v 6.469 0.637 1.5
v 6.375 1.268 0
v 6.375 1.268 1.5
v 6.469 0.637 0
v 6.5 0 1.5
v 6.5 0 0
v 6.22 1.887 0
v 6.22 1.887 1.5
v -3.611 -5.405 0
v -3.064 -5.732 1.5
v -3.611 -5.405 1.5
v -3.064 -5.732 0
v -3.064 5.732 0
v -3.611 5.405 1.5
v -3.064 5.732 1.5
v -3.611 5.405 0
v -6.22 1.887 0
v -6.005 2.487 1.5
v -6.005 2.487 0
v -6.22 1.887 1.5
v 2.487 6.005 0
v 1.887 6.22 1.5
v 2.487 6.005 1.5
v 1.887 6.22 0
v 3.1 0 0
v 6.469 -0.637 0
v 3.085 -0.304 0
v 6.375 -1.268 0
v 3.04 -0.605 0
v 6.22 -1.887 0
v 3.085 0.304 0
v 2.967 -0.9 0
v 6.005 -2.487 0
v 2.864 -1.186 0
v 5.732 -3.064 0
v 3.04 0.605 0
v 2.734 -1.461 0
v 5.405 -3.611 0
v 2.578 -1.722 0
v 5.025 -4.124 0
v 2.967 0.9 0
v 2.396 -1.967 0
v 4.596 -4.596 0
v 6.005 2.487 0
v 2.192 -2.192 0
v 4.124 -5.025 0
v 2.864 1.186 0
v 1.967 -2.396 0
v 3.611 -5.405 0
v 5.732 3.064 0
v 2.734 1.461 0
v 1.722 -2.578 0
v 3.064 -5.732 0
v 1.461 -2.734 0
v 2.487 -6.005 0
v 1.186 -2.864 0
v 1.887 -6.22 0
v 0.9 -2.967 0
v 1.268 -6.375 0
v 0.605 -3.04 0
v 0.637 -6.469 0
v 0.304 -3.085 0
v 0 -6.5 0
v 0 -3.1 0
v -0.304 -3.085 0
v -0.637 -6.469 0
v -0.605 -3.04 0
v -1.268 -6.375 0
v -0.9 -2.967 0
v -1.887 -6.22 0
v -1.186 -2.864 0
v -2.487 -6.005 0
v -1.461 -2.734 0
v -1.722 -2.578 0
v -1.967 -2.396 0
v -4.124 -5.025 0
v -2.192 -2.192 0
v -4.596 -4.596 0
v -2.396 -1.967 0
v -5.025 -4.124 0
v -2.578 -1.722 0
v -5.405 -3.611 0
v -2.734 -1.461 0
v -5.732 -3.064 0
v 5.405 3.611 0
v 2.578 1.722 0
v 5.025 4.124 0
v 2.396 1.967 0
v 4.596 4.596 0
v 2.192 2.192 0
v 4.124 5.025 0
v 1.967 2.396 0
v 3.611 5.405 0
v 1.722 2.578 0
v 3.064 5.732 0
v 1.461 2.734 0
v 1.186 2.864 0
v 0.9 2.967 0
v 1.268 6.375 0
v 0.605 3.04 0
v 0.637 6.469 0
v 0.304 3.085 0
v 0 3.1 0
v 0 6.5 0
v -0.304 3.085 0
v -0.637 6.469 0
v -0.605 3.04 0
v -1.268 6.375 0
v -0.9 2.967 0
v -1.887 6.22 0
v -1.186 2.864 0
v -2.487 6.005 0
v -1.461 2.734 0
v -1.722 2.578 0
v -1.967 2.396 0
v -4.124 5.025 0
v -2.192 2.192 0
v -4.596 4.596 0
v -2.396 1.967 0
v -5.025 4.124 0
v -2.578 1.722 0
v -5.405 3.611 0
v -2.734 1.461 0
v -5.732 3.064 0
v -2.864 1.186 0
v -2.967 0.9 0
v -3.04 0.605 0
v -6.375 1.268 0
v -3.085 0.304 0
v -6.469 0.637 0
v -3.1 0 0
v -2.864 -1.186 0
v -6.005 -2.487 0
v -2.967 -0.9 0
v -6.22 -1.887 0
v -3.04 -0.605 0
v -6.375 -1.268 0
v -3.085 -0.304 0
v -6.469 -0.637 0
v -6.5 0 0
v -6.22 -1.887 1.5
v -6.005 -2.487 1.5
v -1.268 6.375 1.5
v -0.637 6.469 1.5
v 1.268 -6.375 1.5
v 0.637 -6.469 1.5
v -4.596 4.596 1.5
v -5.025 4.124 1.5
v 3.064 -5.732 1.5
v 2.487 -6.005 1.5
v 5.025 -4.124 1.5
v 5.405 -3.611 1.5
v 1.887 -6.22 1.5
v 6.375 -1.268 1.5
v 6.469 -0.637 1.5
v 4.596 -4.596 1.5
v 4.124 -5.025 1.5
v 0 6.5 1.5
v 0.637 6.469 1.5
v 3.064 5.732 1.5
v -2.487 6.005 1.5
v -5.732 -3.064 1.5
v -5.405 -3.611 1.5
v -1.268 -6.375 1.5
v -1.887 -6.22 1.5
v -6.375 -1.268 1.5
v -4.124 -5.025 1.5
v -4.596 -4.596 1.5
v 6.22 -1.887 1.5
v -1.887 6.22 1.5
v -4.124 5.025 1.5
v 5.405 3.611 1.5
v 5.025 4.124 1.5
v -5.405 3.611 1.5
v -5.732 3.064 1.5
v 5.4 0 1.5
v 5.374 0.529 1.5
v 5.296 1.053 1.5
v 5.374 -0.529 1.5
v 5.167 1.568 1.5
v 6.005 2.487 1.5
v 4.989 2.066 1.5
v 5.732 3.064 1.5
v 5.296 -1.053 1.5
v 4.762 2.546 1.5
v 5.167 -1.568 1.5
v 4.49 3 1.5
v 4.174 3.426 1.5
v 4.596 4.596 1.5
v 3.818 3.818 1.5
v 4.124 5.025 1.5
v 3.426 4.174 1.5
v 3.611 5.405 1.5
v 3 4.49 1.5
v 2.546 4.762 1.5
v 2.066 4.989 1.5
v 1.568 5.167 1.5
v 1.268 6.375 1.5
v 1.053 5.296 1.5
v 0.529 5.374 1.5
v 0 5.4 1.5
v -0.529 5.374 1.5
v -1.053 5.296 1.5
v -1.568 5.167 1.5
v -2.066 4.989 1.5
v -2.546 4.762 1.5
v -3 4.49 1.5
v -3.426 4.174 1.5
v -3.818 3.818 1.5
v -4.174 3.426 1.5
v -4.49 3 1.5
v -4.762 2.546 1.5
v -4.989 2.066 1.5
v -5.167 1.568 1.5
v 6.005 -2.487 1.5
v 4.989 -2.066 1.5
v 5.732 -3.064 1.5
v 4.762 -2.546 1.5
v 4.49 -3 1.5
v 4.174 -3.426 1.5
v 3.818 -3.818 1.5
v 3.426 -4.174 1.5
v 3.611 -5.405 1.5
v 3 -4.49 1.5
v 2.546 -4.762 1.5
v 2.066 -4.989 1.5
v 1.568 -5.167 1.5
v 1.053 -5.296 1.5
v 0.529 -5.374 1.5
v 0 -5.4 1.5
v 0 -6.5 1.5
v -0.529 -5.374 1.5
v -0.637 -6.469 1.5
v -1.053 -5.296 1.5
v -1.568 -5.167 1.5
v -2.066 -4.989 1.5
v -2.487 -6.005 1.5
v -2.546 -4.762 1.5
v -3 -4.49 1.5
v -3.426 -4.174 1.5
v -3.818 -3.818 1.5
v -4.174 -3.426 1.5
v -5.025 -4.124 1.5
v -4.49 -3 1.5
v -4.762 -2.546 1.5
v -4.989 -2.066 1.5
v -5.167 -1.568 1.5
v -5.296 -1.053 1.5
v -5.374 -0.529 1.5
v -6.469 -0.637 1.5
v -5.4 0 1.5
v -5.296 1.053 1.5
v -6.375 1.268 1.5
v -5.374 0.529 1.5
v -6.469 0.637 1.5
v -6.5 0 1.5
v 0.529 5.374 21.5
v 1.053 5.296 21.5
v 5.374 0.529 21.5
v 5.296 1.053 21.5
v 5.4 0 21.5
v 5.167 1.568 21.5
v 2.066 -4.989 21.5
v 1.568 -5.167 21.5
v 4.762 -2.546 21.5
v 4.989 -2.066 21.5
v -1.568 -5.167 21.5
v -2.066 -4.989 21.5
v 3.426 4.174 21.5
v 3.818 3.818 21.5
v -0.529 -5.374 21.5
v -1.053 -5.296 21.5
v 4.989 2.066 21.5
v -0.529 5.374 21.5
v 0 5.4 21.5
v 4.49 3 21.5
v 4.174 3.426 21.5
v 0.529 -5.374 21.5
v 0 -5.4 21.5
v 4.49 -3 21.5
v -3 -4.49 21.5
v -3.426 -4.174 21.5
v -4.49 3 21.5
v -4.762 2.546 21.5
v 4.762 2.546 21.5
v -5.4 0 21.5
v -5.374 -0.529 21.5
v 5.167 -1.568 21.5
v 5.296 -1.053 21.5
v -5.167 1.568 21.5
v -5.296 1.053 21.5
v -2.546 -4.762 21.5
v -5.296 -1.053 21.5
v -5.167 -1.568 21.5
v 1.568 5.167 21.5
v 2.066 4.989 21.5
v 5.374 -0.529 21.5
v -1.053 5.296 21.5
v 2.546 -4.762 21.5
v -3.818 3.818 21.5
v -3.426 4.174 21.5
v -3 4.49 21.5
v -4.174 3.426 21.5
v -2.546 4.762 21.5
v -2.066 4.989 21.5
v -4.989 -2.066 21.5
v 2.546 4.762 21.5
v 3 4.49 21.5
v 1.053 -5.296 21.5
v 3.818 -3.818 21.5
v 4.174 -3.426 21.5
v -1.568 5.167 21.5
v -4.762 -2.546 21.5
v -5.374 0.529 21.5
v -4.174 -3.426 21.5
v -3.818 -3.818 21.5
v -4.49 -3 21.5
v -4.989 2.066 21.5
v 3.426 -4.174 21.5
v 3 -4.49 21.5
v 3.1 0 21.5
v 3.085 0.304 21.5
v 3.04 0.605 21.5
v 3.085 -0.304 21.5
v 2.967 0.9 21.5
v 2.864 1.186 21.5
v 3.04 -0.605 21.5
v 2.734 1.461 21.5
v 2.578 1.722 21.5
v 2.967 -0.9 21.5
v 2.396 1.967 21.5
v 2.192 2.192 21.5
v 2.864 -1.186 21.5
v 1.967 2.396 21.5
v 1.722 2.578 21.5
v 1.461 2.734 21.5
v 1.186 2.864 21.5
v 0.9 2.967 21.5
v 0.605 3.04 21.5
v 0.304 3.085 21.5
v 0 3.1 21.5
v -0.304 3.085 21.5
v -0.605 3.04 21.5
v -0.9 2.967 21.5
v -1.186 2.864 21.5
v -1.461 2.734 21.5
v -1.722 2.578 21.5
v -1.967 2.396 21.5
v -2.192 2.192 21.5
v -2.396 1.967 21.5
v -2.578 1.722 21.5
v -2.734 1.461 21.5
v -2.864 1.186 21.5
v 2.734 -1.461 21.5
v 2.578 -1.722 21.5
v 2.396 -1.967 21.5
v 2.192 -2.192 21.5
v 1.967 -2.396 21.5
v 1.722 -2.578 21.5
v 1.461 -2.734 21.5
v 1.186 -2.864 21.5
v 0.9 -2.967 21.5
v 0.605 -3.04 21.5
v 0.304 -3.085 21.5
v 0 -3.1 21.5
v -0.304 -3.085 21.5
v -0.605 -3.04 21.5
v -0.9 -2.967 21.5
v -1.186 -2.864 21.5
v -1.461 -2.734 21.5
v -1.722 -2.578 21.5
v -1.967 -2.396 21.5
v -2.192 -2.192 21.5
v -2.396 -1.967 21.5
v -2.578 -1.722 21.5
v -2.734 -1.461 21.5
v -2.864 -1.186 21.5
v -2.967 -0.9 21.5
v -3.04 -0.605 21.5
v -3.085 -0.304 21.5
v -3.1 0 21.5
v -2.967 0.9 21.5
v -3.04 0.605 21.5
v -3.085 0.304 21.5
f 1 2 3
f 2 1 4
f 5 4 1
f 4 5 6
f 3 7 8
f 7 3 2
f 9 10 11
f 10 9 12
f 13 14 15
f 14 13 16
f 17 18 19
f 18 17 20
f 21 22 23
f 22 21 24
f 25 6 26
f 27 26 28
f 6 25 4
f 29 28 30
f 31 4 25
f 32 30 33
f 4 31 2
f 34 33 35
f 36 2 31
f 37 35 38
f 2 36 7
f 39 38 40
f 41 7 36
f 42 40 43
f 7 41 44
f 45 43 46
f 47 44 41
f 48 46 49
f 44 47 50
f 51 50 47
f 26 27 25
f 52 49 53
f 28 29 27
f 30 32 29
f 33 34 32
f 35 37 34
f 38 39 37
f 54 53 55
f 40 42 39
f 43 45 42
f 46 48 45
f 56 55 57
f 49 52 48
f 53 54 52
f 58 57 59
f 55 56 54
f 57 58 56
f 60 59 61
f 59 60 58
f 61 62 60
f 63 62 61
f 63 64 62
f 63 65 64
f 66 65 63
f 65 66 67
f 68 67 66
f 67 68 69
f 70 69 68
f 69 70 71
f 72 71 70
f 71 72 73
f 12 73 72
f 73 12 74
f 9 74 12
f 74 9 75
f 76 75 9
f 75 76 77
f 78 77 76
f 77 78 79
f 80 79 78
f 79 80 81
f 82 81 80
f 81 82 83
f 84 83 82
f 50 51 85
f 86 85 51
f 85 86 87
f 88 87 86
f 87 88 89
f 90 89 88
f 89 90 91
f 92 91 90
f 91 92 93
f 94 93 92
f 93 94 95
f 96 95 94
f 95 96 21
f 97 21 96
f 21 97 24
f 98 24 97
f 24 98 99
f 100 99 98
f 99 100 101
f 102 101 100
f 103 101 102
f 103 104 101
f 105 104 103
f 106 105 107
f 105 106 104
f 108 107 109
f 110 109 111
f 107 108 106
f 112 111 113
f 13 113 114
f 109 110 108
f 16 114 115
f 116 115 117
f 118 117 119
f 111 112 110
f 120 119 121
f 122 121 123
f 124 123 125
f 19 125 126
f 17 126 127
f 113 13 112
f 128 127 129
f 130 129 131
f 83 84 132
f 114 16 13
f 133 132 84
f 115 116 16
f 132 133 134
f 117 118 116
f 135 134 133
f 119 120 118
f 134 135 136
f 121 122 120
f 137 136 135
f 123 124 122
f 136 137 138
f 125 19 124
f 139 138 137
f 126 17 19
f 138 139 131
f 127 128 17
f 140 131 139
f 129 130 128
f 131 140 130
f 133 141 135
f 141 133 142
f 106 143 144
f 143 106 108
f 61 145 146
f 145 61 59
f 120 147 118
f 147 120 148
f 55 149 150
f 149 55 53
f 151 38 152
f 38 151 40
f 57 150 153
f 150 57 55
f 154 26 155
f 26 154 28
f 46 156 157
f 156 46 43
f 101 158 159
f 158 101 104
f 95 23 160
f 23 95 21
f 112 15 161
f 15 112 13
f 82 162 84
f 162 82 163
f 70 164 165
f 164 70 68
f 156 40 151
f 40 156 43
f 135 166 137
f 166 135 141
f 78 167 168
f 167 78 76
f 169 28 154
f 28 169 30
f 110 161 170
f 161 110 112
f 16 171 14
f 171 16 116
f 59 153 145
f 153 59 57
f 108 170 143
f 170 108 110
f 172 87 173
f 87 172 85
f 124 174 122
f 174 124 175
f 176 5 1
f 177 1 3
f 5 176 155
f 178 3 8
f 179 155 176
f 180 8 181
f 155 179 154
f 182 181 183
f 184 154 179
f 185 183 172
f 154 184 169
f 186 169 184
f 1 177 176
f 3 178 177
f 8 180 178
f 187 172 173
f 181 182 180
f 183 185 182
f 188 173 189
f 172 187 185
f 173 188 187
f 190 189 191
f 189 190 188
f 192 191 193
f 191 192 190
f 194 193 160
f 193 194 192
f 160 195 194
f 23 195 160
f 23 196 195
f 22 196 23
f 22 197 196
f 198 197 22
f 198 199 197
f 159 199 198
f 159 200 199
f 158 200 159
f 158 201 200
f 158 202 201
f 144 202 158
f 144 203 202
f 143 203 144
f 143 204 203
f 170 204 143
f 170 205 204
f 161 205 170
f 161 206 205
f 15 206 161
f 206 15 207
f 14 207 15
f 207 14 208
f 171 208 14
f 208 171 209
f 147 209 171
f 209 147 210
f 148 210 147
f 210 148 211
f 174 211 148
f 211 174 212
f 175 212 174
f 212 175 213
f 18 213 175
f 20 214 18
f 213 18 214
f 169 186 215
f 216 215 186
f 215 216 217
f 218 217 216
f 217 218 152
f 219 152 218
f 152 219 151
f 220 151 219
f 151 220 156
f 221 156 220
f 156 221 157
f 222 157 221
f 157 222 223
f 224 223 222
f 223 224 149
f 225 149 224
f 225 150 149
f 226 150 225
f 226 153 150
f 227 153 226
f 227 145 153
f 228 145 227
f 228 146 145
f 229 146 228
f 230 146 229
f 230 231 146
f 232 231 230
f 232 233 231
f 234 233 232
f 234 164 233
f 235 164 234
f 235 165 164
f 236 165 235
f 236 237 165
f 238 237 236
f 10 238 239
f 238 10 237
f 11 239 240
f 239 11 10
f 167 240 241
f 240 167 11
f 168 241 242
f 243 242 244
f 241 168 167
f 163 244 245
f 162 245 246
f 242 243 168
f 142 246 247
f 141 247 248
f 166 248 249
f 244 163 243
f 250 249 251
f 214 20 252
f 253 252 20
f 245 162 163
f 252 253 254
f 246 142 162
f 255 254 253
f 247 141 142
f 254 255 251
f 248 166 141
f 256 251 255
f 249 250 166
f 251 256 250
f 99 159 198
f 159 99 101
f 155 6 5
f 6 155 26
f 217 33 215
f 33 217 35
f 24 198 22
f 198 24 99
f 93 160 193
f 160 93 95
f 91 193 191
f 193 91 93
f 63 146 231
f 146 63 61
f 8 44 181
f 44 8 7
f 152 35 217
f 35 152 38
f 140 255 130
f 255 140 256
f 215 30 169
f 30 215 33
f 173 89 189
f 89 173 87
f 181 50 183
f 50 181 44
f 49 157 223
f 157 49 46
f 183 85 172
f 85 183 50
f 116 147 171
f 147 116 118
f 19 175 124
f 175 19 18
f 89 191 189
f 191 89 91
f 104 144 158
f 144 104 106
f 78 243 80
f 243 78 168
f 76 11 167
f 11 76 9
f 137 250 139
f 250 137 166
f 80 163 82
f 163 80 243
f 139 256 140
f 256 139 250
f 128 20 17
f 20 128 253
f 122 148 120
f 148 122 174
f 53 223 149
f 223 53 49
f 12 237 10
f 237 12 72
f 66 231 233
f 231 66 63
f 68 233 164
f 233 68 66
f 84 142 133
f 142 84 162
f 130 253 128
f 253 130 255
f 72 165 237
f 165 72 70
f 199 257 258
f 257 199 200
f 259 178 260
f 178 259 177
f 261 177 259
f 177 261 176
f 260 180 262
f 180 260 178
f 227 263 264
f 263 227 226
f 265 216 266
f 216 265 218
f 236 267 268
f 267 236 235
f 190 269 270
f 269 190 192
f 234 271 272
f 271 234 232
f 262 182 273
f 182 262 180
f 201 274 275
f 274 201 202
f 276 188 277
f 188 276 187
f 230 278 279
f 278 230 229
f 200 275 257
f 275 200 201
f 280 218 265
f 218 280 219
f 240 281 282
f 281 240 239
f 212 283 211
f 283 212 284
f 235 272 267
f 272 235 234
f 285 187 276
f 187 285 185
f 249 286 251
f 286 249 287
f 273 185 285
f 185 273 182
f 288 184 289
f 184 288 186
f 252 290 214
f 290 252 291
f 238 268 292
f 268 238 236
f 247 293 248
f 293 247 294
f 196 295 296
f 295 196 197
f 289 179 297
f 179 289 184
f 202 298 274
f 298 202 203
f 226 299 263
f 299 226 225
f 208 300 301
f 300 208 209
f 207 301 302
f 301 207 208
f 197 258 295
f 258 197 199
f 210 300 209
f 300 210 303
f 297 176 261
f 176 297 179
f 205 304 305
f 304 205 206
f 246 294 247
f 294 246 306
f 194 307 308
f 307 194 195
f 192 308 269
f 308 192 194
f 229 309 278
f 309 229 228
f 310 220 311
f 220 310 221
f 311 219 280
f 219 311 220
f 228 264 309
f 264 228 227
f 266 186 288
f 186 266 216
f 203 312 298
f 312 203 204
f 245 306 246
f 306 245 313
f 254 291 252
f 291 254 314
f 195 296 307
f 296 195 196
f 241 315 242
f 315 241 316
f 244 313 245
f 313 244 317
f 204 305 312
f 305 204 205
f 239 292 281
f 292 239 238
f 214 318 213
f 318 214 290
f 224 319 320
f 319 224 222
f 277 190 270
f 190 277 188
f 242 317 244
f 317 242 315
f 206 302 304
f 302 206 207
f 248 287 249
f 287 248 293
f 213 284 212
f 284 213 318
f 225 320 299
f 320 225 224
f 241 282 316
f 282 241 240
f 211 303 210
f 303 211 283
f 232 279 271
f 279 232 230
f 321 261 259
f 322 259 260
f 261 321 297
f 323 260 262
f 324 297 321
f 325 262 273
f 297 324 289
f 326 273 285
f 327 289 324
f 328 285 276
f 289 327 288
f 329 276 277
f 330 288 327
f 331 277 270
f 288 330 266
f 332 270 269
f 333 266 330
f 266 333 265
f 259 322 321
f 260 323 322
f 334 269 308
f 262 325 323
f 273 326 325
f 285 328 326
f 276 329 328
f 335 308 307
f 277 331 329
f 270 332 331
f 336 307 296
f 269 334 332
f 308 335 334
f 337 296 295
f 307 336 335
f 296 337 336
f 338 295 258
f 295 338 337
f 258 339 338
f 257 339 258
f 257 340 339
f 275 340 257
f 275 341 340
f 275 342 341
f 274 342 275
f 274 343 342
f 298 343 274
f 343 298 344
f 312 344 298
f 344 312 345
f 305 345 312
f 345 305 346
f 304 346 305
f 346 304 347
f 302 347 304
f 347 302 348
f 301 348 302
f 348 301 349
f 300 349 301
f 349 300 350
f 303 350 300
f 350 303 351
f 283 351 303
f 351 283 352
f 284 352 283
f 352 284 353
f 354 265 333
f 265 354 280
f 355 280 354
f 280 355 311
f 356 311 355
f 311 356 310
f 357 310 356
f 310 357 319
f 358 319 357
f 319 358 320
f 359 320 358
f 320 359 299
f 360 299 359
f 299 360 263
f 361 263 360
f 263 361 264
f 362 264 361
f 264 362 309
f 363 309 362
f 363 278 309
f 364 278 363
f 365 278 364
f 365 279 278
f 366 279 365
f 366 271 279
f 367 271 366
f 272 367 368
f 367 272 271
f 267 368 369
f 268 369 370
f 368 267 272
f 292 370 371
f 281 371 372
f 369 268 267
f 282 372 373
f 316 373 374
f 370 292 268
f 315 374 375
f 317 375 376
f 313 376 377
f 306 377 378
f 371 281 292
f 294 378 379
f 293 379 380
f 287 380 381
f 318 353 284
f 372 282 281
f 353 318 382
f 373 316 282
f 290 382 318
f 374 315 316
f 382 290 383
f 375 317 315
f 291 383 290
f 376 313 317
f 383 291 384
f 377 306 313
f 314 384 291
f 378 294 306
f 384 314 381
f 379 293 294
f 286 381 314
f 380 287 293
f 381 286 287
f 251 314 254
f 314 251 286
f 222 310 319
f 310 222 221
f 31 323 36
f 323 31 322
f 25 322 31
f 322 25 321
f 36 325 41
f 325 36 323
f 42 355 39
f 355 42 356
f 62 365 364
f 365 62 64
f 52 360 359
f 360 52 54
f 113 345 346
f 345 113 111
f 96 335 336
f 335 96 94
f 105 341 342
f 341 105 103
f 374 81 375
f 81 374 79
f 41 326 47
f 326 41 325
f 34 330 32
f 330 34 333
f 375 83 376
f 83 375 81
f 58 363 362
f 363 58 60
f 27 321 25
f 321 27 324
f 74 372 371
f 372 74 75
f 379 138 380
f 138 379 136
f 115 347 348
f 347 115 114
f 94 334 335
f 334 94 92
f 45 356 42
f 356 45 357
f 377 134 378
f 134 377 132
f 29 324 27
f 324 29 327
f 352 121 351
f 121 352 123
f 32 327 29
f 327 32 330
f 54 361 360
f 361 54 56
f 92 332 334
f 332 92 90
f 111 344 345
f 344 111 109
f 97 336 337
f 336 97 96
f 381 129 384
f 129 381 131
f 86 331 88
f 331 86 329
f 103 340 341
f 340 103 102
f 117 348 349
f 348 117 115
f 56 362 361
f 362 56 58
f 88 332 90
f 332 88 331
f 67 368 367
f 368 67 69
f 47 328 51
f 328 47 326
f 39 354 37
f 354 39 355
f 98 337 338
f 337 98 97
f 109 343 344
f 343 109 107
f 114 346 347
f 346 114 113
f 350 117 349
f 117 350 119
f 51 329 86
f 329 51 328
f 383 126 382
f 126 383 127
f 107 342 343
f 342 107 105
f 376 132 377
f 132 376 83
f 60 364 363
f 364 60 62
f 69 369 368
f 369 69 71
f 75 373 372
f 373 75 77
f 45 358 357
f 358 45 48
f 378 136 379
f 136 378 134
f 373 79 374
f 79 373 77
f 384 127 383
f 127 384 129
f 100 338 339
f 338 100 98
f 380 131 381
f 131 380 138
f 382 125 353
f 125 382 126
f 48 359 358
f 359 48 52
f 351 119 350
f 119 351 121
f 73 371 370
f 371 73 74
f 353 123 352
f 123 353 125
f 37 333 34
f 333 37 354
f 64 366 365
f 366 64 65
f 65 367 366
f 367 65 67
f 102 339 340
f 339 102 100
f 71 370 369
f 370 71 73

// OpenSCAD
// Adapter sleeve: 0.2 mL PCR tube in a 1.5 mL rack hole
// Print orientation: collar down on the bed, sleeve body up (+Z)

$fn = 64;

// ---- Dimensions (mm) ----
collar_d      = 13;    // collar outer diameter
collar_h      = 1.5;   // collar thickness (z = 0 to 1.5)
sleeve_od     = 10.8;  // sleeve body outer diameter
sleeve_top_z  = 21.5;  // top of sleeve body
bore_d        = 6.2;   // through-bore diameter
eps           = 0.5;   // cutter overshoot past faces

// ---- Model ----
difference() {
    union() {
        // Collar
        cylinder(d = collar_d, h = collar_h);
        // Sleeve body (overlaps collar slightly for a clean union)
        translate([0, 0, collar_h - 0.01])
            cylinder(d = sleeve_od, h = sleeve_top_z - collar_h + 0.01);
    }
    // Full-height bore, open at both ends
    translate([0, 0, -eps])
        cylinder(d = bore_d, h = sleeve_top_z + 2 * eps);
}
